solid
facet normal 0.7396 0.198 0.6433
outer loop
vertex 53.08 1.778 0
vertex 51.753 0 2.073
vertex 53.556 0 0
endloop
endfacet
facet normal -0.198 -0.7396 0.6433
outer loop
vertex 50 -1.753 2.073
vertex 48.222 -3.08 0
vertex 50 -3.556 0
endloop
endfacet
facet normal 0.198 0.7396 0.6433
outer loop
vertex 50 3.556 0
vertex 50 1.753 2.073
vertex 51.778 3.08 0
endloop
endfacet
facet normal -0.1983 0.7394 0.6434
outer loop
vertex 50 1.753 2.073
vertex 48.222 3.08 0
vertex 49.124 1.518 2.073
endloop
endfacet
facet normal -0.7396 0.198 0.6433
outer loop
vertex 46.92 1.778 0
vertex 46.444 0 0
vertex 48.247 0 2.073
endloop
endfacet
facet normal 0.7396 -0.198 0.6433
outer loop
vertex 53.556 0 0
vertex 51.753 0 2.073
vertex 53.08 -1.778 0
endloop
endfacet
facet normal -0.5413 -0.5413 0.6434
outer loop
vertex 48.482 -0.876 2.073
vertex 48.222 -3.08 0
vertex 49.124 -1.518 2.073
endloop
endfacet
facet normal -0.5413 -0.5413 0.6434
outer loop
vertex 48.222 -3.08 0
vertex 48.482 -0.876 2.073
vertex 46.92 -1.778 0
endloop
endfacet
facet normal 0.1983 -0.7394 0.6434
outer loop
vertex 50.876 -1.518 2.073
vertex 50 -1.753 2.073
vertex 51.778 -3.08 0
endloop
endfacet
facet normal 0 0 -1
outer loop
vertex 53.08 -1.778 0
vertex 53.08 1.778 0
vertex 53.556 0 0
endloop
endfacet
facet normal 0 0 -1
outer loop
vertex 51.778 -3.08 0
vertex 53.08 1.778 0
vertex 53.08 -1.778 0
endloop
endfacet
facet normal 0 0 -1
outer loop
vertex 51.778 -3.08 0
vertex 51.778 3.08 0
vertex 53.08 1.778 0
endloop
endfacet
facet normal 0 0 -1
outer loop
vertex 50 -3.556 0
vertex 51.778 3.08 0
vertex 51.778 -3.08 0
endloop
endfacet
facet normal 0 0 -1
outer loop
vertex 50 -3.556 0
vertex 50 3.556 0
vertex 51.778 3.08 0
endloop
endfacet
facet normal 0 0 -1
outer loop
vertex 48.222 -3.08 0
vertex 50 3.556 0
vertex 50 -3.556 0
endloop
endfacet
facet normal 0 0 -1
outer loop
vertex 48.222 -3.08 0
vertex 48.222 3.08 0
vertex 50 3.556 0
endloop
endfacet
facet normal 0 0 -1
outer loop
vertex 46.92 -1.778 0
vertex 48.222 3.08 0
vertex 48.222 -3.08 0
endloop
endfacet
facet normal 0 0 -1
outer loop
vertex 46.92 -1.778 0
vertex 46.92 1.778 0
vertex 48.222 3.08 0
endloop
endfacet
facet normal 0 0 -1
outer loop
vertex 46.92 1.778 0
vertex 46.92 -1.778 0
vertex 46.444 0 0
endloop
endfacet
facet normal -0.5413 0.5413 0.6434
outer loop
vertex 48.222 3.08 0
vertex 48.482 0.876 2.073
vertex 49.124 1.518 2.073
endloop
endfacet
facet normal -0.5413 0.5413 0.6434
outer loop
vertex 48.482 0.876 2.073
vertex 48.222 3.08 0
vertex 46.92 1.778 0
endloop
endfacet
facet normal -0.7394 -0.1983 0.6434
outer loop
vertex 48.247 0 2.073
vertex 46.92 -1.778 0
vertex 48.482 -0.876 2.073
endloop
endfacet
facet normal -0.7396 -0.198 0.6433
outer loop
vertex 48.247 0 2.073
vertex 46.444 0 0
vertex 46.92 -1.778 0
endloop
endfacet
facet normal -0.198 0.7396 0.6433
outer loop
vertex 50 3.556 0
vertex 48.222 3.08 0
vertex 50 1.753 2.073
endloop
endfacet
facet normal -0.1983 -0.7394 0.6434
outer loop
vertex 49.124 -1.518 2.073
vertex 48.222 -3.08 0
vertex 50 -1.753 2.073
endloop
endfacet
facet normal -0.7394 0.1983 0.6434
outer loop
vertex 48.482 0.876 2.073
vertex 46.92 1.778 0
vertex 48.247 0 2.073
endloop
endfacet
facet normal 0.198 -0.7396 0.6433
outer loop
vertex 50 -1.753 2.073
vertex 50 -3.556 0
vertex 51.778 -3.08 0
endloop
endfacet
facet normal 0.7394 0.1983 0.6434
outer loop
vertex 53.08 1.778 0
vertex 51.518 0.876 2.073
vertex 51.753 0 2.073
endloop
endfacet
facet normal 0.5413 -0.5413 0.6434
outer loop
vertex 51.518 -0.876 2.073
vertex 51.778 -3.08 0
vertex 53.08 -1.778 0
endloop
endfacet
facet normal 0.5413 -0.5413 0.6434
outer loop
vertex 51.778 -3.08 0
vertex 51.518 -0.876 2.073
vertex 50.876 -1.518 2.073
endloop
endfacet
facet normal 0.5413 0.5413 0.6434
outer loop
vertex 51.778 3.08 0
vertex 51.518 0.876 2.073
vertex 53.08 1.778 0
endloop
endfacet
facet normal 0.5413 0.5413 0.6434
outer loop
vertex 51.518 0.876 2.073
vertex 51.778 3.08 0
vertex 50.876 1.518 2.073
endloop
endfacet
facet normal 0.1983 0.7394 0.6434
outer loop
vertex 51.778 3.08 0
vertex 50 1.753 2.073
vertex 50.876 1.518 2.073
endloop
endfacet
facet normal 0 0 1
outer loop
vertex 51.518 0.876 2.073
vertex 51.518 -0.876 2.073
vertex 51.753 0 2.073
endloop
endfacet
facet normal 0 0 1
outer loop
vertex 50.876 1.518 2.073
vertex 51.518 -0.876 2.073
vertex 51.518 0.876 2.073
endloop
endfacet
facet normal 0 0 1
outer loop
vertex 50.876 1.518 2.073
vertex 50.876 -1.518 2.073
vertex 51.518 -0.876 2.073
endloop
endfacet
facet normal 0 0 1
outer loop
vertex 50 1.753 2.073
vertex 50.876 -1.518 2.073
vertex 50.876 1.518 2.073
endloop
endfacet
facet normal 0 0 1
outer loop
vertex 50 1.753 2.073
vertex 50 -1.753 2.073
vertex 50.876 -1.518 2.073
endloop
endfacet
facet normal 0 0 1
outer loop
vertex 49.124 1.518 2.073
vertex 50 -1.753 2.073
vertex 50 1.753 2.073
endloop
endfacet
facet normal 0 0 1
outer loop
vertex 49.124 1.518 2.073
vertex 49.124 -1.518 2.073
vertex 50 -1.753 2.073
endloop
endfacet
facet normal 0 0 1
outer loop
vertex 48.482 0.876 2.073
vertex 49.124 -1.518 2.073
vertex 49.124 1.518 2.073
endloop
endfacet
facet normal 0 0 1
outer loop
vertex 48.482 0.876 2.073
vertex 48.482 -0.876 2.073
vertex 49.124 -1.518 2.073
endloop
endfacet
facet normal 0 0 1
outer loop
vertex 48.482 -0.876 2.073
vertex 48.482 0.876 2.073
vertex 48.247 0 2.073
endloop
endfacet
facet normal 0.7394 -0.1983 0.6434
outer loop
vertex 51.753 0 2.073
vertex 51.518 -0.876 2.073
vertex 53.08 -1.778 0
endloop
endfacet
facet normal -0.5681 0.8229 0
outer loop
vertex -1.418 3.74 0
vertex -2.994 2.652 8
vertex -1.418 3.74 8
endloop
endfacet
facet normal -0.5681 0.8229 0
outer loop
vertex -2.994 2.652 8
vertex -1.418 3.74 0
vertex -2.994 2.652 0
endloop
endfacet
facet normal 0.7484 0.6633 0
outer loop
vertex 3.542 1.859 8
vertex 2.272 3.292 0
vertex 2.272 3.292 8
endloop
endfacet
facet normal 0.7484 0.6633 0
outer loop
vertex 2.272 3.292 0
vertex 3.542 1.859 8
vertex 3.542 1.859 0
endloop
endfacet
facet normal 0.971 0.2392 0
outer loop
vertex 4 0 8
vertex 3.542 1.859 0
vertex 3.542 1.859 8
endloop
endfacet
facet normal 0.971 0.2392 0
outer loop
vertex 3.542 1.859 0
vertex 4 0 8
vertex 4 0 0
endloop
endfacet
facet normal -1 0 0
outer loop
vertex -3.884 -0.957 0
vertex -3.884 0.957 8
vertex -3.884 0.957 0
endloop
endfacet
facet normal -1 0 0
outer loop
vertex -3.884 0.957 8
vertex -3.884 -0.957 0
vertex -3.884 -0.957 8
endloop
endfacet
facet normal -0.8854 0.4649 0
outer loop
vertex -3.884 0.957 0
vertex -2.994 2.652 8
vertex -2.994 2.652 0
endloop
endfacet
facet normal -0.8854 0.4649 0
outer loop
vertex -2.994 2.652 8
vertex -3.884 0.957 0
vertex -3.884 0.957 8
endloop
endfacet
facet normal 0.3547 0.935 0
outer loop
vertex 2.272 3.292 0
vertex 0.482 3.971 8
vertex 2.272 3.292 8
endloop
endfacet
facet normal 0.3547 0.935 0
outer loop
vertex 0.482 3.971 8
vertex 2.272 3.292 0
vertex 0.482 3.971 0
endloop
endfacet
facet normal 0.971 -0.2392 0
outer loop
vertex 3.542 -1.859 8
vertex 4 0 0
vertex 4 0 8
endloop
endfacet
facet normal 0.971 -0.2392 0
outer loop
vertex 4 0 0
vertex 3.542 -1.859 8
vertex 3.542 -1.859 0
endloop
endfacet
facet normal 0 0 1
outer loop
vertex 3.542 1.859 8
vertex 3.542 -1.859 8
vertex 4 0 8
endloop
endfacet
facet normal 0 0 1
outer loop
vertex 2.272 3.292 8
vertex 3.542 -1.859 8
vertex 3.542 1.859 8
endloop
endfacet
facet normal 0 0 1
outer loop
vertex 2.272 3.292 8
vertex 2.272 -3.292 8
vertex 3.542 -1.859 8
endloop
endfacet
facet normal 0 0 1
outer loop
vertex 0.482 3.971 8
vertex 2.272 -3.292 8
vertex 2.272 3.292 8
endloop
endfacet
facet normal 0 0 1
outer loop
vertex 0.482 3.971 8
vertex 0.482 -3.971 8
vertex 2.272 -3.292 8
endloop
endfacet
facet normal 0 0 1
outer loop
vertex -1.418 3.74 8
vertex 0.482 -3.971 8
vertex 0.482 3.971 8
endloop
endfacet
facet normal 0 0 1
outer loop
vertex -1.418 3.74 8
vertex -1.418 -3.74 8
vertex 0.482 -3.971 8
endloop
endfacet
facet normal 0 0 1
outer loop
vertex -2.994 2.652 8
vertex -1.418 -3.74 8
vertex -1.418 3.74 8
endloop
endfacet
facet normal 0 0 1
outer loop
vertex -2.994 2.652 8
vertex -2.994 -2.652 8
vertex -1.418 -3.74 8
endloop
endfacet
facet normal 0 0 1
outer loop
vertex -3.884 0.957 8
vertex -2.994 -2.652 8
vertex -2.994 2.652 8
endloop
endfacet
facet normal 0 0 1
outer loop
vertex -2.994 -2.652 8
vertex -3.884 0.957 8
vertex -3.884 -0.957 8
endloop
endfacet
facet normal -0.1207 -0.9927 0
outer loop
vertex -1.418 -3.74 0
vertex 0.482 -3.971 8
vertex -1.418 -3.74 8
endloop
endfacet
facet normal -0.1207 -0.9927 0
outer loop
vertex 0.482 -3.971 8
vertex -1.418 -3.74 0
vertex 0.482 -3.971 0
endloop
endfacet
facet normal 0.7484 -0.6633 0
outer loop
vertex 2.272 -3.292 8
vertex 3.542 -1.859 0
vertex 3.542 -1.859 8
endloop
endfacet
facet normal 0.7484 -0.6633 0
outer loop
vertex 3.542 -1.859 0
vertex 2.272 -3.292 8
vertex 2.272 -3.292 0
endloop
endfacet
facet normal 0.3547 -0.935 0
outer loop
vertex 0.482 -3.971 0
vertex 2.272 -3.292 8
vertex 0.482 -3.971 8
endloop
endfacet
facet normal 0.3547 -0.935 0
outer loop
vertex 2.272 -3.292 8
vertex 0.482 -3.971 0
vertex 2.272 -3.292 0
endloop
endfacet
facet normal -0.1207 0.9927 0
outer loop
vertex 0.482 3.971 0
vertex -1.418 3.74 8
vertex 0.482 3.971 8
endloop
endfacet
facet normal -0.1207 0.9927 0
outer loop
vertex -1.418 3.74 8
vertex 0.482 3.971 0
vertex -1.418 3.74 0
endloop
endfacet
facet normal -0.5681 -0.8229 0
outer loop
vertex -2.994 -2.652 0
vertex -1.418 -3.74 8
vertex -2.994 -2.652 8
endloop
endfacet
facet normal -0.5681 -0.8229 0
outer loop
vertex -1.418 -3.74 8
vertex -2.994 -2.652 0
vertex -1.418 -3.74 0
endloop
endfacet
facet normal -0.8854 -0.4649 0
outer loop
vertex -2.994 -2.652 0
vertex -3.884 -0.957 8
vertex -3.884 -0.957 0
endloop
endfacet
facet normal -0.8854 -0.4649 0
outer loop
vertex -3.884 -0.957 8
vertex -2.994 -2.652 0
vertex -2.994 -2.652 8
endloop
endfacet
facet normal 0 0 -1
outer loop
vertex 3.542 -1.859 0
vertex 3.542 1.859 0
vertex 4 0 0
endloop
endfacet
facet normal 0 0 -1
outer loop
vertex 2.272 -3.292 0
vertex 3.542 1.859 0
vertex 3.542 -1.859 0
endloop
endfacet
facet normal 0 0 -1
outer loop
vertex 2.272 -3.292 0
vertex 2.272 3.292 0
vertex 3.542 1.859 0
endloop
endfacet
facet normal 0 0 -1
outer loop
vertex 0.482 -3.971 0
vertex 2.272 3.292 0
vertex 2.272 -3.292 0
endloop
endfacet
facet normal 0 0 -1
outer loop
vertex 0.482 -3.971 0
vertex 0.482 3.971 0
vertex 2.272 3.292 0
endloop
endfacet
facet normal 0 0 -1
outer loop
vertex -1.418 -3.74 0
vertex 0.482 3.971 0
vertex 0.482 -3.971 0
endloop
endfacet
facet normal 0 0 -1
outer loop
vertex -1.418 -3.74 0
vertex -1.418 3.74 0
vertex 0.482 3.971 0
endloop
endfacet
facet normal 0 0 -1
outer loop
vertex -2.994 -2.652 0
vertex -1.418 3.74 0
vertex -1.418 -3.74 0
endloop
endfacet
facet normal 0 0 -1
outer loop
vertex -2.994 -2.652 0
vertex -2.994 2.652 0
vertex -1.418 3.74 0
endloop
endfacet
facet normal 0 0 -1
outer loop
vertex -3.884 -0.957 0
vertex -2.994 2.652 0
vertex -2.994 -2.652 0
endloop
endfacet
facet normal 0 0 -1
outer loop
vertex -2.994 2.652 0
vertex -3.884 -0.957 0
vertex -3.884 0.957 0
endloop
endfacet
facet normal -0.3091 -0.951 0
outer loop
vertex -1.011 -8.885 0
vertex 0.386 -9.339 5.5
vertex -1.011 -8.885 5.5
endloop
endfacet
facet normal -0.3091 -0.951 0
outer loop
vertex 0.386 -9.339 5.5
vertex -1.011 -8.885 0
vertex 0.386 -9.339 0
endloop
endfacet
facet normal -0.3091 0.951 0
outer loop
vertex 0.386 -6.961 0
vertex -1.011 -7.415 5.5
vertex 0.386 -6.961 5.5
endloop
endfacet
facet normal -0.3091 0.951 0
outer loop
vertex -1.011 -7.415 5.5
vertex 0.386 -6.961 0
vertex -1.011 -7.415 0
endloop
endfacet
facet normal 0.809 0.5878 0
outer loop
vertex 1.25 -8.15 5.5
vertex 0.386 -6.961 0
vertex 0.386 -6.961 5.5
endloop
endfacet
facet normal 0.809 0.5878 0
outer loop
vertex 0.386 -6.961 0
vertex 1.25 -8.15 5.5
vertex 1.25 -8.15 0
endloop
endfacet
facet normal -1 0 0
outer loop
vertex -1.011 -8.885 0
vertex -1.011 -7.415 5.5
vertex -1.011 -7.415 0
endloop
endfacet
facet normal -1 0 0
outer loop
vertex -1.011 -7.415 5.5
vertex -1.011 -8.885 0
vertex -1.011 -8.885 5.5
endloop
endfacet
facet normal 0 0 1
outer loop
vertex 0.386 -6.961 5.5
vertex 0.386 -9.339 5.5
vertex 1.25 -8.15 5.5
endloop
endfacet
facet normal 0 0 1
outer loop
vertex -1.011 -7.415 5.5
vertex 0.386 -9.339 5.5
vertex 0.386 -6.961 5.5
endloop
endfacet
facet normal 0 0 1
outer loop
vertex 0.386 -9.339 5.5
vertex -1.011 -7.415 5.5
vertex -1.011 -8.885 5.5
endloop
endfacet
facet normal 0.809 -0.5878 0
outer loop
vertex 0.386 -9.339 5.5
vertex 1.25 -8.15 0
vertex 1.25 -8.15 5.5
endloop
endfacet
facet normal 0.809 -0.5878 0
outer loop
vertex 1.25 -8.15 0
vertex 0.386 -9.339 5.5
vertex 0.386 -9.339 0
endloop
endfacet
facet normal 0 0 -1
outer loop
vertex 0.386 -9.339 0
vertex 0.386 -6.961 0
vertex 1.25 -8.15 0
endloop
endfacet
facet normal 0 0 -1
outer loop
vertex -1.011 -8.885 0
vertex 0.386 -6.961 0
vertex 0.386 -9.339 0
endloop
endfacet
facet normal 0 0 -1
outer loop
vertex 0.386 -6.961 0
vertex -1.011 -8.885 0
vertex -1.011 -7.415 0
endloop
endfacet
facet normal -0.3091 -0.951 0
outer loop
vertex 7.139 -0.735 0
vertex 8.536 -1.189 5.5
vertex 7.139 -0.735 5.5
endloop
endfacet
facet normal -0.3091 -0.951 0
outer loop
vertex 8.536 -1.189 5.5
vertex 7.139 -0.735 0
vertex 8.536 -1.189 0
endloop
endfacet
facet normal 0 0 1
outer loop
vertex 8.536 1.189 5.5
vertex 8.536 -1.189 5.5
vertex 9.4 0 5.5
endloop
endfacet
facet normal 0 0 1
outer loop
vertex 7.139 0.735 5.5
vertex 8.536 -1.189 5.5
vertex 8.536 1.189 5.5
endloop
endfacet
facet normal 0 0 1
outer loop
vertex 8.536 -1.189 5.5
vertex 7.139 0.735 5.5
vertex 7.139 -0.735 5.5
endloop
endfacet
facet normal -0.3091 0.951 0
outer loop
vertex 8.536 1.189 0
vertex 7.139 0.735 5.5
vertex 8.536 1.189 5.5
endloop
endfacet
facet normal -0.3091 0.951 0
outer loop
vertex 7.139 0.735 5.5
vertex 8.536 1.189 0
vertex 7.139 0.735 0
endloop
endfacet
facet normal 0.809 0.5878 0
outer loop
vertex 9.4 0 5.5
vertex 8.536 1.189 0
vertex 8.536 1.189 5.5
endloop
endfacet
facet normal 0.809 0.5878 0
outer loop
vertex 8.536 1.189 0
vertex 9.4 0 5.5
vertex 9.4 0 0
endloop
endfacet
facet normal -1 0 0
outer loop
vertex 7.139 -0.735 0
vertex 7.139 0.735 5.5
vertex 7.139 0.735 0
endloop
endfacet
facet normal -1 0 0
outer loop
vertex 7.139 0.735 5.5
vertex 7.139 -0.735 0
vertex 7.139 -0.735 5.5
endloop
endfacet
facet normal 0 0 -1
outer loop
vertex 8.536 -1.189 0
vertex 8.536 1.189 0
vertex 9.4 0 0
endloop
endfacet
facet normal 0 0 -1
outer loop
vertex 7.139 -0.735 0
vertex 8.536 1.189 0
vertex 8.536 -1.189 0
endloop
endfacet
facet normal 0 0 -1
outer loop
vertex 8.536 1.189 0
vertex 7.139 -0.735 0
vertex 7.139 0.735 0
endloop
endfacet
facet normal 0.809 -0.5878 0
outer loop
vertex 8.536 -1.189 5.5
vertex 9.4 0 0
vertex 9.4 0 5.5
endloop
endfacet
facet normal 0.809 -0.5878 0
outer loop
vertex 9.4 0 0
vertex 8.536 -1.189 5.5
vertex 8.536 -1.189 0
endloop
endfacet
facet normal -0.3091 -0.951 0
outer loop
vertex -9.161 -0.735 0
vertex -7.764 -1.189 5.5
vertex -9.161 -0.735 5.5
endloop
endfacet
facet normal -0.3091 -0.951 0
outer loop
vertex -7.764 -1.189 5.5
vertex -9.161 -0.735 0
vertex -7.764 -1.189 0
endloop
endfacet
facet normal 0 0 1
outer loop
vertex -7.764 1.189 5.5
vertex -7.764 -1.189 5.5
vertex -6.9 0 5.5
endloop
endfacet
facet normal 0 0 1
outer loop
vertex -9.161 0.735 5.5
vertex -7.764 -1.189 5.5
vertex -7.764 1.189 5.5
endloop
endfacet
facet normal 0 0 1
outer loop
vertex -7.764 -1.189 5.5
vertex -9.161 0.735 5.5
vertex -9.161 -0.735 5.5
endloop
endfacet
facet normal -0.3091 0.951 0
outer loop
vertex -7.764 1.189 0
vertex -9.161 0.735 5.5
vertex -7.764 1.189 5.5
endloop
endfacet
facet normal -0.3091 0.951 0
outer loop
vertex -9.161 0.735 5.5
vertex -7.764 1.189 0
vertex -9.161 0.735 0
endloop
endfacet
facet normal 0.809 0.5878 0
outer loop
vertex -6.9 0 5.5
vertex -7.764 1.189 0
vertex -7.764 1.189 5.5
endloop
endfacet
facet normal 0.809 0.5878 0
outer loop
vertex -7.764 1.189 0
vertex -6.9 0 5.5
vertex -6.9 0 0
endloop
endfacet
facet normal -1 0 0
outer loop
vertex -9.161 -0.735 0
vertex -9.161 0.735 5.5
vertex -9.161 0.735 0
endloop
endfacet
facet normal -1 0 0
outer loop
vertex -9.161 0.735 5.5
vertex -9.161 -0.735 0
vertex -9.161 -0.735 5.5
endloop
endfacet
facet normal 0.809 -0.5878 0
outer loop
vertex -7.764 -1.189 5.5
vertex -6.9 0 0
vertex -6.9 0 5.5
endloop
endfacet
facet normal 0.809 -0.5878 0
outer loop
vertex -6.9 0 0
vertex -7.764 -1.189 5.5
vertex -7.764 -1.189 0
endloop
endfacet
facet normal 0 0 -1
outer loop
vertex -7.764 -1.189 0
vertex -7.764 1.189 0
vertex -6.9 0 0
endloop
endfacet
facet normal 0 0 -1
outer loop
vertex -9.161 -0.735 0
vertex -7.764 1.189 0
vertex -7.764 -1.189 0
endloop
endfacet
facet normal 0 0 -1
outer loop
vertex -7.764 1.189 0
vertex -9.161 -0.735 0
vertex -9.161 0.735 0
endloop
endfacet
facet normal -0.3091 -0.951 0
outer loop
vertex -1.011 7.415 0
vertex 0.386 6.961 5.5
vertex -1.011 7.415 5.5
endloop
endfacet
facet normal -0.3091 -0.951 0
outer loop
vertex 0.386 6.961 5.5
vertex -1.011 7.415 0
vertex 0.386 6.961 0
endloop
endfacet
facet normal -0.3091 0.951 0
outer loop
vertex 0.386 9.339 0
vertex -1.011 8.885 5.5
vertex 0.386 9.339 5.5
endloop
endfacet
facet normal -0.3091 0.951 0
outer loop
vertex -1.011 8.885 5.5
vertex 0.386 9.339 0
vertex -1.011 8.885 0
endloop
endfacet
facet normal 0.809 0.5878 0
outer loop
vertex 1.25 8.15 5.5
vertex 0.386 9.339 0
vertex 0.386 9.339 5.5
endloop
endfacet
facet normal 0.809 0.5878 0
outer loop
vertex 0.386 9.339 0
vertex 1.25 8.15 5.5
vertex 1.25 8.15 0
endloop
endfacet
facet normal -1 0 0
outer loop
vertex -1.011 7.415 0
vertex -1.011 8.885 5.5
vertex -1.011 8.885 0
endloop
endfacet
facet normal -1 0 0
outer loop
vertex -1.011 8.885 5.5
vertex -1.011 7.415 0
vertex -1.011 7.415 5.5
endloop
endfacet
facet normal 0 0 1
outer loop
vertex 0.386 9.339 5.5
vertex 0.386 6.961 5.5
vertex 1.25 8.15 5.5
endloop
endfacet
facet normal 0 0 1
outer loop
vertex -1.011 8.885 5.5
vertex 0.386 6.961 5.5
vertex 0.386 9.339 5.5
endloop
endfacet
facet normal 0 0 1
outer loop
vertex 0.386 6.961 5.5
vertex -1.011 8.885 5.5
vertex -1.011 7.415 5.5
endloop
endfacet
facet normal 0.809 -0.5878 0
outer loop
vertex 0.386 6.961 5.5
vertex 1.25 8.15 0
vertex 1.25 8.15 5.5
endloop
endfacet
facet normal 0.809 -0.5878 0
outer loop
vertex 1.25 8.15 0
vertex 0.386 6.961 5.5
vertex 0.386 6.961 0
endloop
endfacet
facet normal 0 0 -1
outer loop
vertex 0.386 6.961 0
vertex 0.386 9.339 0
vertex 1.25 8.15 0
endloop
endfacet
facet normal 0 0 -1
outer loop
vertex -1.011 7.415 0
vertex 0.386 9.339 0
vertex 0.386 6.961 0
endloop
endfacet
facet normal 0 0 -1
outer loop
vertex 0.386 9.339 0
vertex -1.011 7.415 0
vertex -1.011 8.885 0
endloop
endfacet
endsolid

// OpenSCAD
in2cm=25.4;




translate([50,0,0])
cylinder(.0816*in2cm,d1=.280*in2cm,d2=.138*in2cm);

cylinder(8,d=8);

translate([0,-16.3/2,0])
cylinder(5.5,d=2.5);

translate([16.3/2,0,0])
cylinder(5.5,d=2.5);

translate([-16.3/2,0,0])
cylinder(5.5,d=2.5);

translate([0,16.3/2,0])
cylinder(5.5,d=2.5);

//translate([0,0,.097*in2cm])
  //  cylinder(3,.138*in2cm/2,.138*in2cm);
